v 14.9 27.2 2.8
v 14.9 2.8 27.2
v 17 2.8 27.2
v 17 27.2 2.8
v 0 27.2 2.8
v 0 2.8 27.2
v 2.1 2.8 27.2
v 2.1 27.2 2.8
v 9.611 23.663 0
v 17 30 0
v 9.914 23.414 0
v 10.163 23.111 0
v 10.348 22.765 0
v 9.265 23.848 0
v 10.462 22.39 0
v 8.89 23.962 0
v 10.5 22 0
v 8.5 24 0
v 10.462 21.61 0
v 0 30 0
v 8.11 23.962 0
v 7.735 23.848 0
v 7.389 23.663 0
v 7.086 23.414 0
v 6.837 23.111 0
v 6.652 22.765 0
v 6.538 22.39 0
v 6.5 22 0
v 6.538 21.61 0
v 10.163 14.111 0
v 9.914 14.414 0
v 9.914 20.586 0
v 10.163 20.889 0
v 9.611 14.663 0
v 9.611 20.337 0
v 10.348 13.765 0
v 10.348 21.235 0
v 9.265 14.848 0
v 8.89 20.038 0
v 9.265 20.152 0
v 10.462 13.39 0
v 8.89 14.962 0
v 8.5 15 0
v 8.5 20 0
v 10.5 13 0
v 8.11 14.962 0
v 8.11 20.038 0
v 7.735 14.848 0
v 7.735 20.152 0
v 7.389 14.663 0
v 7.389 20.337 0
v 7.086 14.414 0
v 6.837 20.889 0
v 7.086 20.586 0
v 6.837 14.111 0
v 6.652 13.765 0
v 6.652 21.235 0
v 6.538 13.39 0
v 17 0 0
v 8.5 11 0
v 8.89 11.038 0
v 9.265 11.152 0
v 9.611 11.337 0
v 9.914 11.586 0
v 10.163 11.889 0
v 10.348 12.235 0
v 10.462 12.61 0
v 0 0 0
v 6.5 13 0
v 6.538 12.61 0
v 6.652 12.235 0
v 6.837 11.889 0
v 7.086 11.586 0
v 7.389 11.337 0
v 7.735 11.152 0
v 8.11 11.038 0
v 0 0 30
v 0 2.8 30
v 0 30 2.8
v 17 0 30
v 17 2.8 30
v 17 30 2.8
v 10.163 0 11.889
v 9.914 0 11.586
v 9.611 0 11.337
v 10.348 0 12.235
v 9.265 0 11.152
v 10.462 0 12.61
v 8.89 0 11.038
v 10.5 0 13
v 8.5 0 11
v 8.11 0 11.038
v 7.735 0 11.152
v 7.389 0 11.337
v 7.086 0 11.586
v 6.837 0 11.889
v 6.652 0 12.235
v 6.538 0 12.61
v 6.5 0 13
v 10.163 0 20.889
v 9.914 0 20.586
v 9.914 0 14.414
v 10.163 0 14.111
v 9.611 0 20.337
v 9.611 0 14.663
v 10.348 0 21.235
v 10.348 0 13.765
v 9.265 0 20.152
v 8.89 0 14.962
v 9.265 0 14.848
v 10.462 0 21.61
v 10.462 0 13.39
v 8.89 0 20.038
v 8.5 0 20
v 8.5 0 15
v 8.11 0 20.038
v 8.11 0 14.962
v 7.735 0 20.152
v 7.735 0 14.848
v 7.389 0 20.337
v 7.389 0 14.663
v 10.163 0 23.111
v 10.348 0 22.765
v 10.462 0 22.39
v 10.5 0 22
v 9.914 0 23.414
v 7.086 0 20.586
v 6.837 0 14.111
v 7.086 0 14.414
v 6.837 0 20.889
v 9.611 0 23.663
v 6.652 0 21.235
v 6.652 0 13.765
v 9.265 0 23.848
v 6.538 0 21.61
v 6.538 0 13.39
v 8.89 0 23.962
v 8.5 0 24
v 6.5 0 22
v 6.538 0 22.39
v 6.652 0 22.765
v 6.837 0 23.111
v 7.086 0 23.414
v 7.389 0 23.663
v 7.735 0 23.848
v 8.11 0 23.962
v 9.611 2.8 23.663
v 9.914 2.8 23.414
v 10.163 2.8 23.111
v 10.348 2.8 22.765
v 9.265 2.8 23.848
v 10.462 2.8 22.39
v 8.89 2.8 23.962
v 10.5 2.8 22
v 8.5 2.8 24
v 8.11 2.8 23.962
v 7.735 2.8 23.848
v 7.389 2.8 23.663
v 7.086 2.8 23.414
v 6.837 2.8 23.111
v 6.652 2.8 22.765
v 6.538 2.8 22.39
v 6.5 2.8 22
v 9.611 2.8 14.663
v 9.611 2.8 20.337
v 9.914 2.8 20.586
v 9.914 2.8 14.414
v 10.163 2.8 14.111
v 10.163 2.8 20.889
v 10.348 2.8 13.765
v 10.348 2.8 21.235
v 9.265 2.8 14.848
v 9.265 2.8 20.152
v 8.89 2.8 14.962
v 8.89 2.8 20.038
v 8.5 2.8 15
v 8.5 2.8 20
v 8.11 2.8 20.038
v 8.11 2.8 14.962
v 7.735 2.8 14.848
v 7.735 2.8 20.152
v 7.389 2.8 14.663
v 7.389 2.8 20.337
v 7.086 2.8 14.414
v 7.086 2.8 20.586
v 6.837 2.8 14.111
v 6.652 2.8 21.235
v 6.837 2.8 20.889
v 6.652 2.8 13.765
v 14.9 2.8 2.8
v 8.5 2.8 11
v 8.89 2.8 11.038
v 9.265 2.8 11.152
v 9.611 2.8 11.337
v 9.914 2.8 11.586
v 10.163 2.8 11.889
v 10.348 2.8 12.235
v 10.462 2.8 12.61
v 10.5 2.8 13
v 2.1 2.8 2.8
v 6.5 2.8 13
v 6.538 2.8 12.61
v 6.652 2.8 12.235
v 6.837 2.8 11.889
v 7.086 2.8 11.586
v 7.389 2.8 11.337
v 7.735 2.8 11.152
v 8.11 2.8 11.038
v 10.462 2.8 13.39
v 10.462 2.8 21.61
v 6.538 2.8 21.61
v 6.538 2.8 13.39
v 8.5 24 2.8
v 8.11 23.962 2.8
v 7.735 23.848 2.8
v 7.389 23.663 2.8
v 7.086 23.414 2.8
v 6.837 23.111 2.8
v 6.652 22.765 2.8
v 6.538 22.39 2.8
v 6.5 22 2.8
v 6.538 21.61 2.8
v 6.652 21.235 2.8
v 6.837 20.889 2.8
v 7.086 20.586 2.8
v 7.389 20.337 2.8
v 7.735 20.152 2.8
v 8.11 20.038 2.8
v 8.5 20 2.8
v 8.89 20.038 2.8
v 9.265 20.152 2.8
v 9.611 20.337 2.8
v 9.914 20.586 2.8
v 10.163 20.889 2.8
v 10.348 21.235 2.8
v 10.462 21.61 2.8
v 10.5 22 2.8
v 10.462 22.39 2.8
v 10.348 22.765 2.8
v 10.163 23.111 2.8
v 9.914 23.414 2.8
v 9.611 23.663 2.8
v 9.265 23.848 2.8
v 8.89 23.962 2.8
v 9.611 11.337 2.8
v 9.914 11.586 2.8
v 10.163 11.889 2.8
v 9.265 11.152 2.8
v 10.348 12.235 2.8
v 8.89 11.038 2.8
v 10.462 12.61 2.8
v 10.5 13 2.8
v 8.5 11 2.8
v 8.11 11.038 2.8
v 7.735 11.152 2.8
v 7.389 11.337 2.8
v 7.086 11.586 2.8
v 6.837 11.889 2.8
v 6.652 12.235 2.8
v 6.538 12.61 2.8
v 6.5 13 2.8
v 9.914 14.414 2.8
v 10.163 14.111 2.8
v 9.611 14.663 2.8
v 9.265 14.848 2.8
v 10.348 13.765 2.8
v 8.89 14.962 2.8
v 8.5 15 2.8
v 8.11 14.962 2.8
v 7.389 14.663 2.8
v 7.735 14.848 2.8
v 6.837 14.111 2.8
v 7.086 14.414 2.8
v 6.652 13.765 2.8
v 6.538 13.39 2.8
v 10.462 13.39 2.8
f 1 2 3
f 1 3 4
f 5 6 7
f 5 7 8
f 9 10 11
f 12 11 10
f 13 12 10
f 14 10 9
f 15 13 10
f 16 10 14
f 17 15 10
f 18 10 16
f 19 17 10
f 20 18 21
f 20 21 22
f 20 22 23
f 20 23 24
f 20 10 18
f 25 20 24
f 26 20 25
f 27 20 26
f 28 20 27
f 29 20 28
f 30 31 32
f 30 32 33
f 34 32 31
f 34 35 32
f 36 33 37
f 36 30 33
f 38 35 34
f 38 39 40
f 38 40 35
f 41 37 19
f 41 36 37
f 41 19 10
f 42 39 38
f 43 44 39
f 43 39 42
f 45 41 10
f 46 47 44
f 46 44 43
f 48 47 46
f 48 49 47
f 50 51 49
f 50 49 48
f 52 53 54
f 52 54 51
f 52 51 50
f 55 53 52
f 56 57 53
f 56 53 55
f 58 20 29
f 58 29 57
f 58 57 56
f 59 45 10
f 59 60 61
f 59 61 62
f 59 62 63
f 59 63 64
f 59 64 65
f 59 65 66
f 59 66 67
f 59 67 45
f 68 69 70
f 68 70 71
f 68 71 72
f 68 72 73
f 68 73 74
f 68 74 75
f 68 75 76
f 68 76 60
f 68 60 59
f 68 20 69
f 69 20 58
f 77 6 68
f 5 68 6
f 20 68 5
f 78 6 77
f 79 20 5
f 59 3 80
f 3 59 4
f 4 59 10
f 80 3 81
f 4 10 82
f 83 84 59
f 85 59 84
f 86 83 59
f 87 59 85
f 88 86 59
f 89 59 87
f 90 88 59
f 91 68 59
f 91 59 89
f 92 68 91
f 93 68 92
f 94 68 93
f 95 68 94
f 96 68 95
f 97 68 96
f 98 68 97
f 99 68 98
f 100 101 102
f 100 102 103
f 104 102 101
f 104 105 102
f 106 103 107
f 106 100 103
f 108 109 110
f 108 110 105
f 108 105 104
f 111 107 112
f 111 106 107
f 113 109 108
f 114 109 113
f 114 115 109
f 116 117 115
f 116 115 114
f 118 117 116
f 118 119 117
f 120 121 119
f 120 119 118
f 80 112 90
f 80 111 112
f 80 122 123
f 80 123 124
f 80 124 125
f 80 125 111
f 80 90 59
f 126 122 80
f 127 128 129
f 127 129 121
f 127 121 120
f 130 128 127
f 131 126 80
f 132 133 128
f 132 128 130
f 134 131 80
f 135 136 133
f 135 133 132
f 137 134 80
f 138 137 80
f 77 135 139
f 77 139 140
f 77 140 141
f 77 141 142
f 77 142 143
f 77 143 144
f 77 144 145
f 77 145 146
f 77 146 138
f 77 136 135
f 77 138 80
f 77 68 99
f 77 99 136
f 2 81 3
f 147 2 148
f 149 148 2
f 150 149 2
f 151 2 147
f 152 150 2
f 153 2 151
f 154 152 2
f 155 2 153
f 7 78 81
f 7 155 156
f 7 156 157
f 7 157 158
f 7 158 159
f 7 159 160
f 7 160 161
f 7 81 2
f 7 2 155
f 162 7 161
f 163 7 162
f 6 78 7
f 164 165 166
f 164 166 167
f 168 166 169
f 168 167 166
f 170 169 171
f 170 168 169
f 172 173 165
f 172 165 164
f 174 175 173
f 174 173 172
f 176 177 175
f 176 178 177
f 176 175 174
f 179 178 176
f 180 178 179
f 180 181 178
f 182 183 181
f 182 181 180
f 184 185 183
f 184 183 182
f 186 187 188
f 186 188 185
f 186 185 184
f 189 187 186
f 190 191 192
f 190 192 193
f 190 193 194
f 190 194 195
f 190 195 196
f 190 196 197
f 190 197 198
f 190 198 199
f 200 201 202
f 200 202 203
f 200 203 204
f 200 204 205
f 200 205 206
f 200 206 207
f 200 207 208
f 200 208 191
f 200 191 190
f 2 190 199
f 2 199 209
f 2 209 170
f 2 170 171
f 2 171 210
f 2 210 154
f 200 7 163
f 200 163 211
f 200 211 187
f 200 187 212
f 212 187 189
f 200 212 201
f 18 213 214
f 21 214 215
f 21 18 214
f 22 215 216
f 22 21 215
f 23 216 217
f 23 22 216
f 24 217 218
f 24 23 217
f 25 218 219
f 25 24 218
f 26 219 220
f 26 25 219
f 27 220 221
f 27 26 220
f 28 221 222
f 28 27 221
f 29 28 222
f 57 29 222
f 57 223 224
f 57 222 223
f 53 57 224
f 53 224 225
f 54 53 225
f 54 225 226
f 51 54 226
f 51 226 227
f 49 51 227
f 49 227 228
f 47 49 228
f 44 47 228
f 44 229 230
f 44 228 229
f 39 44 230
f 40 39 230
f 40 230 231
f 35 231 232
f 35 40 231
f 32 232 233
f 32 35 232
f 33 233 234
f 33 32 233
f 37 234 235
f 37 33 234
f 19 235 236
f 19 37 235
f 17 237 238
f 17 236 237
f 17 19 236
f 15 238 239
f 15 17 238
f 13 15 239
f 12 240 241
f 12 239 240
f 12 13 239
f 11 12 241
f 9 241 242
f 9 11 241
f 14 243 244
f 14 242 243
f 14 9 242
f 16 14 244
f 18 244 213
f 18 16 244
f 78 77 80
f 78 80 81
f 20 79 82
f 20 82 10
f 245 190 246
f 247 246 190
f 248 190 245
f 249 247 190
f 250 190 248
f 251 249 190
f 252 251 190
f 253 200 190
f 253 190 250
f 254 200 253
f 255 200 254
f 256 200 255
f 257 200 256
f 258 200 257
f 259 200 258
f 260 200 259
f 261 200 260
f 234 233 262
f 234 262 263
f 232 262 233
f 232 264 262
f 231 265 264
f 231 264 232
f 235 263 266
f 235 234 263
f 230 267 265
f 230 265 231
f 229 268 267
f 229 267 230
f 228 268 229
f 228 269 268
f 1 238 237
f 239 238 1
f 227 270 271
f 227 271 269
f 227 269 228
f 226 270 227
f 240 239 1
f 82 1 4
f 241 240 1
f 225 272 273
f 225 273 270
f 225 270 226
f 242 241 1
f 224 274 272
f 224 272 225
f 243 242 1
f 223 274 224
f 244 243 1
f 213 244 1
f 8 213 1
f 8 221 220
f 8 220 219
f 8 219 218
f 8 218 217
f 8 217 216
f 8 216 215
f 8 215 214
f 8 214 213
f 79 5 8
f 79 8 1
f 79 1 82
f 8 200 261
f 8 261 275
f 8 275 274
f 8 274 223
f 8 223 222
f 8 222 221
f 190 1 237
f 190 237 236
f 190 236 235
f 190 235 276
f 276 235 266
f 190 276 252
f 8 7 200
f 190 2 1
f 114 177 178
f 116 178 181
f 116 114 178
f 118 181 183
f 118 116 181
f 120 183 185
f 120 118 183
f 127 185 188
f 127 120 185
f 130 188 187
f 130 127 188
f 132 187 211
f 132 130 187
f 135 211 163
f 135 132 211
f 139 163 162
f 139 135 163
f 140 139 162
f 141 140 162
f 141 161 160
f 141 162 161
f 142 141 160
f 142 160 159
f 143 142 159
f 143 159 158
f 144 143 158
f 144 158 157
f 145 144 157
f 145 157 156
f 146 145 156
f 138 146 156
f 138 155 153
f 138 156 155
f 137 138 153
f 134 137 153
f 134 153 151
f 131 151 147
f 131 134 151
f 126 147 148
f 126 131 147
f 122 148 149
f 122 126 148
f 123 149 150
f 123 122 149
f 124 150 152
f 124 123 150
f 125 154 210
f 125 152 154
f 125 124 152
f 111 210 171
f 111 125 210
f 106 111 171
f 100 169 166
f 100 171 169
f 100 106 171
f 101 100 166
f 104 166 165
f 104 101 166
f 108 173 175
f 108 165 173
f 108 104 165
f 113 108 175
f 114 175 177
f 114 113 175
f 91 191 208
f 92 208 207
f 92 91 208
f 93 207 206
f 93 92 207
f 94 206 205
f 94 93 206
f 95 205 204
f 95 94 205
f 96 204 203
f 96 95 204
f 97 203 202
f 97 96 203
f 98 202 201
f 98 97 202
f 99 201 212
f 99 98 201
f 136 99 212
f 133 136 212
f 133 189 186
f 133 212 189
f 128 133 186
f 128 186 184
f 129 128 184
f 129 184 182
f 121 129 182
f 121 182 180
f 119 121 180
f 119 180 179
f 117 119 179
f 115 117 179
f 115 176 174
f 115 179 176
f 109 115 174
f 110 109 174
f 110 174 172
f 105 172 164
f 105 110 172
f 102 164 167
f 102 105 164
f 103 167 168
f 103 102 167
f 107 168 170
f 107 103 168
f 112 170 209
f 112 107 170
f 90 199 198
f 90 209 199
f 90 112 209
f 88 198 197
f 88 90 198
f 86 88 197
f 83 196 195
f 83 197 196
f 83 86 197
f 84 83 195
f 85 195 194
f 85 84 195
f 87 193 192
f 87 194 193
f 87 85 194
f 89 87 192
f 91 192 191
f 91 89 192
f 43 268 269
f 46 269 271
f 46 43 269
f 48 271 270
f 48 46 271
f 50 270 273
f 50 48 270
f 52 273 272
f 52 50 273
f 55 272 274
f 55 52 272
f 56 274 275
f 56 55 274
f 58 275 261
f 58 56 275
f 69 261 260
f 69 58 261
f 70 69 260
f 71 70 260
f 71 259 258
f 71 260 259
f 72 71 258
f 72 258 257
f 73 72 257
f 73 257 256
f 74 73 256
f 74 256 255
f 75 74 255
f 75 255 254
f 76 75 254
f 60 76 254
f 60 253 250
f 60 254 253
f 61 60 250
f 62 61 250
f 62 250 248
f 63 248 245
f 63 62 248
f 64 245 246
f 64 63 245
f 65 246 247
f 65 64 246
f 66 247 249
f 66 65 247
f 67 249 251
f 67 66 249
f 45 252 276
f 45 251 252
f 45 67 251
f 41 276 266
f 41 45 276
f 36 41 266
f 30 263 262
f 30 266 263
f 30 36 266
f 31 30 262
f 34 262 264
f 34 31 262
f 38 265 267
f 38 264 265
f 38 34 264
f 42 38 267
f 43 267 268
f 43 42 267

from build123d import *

# Parameters (mm, degrees)
EXTRUDE_1_DEPTH     = 17
CUT_EXTRUDE_START   = 30
SKETCH_2_W          = 12.8
SKETCH_2_H          = 24.4
CUT_EXTRUDE_1_DEPTH = 27.2
CUT_EXTRUDE_2_REACH = 47.706
SKETCH_3_R          = 2
CUT_EXTRUDE_3_REACH = 47.706
SKETCH_4_R          = 2


with BuildPart() as part:
    # 草图1 → 凸台-拉伸1 (new body)
    with BuildSketch(Plane(origin=(0, 0, 0), x_dir=(0, 0, -1), z_dir=(1, 0, 0))):
        Polygon((0, 0), (-30, 0), (-30, 2.8), (-27.2, 2.8), (-2.8, 27.2), (-2.8, 30), (0, 30), align=None)
    extrude(amount=EXTRUDE_1_DEPTH)

    # 草图2 → 切除-拉伸1 (cut)
    with BuildSketch(Plane(origin=(0, 0, 0), x_dir=(1, 0, 0), z_dir=(0, 1, 0)).offset(CUT_EXTRUDE_START)):
        with Locations((8.5, -15)):
            Rectangle(SKETCH_2_W, SKETCH_2_H)
    extrude(amount=-CUT_EXTRUDE_1_DEPTH, mode=Mode.SUBTRACT)

    # 草图3 → 切除-拉伸2 (cut, up to next)
    with BuildSketch(Plane(origin=(0, 0, 0), x_dir=(1, 0, 0), z_dir=(0, 1, 0)), mode=Mode.PRIVATE) as cut_extrude_2_sk1:
        with Locations(Location((8.5, -22, 0), (0, 0, 90))):
            Circle(SKETCH_3_R)
    cut_extrude_2_tool1 = extrude(cut_extrude_2_sk1.sketch, amount=CUT_EXTRUDE_2_REACH, mode=Mode.PRIVATE) & part.part
    # 草图3 → 切除-拉伸2 (cut, up to next)
    with BuildSketch(Plane(origin=(0, 0, 0), x_dir=(1, 0, 0), z_dir=(0, 1, 0)), mode=Mode.PRIVATE) as cut_extrude_2_sk2:
        with Locations(Location((8.5, -13, 0), (0, 0, 90))):
            Circle(SKETCH_3_R)
    cut_extrude_2_tool2 = extrude(cut_extrude_2_sk2.sketch, amount=CUT_EXTRUDE_2_REACH, mode=Mode.PRIVATE) & part.part
    add(cut_extrude_2_tool1.solids().sort_by_distance((8.5, 0, 22))[0], mode=Mode.SUBTRACT)
    add(cut_extrude_2_tool2.solids().sort_by_distance((8.5, 0, 13))[0], mode=Mode.SUBTRACT)

    # 草图4 → 切除-拉伸3 (cut, up to next)
    with BuildSketch(Plane.XY, mode=Mode.PRIVATE) as cut_extrude_3_sk1:
        with Locations(Location((8.5, 22, 0), (0, 0, 90))):
            Circle(SKETCH_4_R)
    cut_extrude_3_tool1 = extrude(cut_extrude_3_sk1.sketch, amount=CUT_EXTRUDE_3_REACH, mode=Mode.PRIVATE) & part.part
    # 草图4 → 切除-拉伸3 (cut, up to next)
    with BuildSketch(Plane.XY, mode=Mode.PRIVATE) as cut_extrude_3_sk2:
        with Locations(Location((8.5, 13, 0), (0, 0, 90))):
            Circle(SKETCH_4_R)
    cut_extrude_3_tool2 = extrude(cut_extrude_3_sk2.sketch, amount=CUT_EXTRUDE_3_REACH, mode=Mode.PRIVATE) & part.part
    add(cut_extrude_3_tool1.solids().sort_by_distance((8.5, 22, 0))[0], mode=Mode.SUBTRACT)
    add(cut_extrude_3_tool2.solids().sort_by_distance((8.5, 13, 0))[0], mode=Mode.SUBTRACT)


solid = part.part
